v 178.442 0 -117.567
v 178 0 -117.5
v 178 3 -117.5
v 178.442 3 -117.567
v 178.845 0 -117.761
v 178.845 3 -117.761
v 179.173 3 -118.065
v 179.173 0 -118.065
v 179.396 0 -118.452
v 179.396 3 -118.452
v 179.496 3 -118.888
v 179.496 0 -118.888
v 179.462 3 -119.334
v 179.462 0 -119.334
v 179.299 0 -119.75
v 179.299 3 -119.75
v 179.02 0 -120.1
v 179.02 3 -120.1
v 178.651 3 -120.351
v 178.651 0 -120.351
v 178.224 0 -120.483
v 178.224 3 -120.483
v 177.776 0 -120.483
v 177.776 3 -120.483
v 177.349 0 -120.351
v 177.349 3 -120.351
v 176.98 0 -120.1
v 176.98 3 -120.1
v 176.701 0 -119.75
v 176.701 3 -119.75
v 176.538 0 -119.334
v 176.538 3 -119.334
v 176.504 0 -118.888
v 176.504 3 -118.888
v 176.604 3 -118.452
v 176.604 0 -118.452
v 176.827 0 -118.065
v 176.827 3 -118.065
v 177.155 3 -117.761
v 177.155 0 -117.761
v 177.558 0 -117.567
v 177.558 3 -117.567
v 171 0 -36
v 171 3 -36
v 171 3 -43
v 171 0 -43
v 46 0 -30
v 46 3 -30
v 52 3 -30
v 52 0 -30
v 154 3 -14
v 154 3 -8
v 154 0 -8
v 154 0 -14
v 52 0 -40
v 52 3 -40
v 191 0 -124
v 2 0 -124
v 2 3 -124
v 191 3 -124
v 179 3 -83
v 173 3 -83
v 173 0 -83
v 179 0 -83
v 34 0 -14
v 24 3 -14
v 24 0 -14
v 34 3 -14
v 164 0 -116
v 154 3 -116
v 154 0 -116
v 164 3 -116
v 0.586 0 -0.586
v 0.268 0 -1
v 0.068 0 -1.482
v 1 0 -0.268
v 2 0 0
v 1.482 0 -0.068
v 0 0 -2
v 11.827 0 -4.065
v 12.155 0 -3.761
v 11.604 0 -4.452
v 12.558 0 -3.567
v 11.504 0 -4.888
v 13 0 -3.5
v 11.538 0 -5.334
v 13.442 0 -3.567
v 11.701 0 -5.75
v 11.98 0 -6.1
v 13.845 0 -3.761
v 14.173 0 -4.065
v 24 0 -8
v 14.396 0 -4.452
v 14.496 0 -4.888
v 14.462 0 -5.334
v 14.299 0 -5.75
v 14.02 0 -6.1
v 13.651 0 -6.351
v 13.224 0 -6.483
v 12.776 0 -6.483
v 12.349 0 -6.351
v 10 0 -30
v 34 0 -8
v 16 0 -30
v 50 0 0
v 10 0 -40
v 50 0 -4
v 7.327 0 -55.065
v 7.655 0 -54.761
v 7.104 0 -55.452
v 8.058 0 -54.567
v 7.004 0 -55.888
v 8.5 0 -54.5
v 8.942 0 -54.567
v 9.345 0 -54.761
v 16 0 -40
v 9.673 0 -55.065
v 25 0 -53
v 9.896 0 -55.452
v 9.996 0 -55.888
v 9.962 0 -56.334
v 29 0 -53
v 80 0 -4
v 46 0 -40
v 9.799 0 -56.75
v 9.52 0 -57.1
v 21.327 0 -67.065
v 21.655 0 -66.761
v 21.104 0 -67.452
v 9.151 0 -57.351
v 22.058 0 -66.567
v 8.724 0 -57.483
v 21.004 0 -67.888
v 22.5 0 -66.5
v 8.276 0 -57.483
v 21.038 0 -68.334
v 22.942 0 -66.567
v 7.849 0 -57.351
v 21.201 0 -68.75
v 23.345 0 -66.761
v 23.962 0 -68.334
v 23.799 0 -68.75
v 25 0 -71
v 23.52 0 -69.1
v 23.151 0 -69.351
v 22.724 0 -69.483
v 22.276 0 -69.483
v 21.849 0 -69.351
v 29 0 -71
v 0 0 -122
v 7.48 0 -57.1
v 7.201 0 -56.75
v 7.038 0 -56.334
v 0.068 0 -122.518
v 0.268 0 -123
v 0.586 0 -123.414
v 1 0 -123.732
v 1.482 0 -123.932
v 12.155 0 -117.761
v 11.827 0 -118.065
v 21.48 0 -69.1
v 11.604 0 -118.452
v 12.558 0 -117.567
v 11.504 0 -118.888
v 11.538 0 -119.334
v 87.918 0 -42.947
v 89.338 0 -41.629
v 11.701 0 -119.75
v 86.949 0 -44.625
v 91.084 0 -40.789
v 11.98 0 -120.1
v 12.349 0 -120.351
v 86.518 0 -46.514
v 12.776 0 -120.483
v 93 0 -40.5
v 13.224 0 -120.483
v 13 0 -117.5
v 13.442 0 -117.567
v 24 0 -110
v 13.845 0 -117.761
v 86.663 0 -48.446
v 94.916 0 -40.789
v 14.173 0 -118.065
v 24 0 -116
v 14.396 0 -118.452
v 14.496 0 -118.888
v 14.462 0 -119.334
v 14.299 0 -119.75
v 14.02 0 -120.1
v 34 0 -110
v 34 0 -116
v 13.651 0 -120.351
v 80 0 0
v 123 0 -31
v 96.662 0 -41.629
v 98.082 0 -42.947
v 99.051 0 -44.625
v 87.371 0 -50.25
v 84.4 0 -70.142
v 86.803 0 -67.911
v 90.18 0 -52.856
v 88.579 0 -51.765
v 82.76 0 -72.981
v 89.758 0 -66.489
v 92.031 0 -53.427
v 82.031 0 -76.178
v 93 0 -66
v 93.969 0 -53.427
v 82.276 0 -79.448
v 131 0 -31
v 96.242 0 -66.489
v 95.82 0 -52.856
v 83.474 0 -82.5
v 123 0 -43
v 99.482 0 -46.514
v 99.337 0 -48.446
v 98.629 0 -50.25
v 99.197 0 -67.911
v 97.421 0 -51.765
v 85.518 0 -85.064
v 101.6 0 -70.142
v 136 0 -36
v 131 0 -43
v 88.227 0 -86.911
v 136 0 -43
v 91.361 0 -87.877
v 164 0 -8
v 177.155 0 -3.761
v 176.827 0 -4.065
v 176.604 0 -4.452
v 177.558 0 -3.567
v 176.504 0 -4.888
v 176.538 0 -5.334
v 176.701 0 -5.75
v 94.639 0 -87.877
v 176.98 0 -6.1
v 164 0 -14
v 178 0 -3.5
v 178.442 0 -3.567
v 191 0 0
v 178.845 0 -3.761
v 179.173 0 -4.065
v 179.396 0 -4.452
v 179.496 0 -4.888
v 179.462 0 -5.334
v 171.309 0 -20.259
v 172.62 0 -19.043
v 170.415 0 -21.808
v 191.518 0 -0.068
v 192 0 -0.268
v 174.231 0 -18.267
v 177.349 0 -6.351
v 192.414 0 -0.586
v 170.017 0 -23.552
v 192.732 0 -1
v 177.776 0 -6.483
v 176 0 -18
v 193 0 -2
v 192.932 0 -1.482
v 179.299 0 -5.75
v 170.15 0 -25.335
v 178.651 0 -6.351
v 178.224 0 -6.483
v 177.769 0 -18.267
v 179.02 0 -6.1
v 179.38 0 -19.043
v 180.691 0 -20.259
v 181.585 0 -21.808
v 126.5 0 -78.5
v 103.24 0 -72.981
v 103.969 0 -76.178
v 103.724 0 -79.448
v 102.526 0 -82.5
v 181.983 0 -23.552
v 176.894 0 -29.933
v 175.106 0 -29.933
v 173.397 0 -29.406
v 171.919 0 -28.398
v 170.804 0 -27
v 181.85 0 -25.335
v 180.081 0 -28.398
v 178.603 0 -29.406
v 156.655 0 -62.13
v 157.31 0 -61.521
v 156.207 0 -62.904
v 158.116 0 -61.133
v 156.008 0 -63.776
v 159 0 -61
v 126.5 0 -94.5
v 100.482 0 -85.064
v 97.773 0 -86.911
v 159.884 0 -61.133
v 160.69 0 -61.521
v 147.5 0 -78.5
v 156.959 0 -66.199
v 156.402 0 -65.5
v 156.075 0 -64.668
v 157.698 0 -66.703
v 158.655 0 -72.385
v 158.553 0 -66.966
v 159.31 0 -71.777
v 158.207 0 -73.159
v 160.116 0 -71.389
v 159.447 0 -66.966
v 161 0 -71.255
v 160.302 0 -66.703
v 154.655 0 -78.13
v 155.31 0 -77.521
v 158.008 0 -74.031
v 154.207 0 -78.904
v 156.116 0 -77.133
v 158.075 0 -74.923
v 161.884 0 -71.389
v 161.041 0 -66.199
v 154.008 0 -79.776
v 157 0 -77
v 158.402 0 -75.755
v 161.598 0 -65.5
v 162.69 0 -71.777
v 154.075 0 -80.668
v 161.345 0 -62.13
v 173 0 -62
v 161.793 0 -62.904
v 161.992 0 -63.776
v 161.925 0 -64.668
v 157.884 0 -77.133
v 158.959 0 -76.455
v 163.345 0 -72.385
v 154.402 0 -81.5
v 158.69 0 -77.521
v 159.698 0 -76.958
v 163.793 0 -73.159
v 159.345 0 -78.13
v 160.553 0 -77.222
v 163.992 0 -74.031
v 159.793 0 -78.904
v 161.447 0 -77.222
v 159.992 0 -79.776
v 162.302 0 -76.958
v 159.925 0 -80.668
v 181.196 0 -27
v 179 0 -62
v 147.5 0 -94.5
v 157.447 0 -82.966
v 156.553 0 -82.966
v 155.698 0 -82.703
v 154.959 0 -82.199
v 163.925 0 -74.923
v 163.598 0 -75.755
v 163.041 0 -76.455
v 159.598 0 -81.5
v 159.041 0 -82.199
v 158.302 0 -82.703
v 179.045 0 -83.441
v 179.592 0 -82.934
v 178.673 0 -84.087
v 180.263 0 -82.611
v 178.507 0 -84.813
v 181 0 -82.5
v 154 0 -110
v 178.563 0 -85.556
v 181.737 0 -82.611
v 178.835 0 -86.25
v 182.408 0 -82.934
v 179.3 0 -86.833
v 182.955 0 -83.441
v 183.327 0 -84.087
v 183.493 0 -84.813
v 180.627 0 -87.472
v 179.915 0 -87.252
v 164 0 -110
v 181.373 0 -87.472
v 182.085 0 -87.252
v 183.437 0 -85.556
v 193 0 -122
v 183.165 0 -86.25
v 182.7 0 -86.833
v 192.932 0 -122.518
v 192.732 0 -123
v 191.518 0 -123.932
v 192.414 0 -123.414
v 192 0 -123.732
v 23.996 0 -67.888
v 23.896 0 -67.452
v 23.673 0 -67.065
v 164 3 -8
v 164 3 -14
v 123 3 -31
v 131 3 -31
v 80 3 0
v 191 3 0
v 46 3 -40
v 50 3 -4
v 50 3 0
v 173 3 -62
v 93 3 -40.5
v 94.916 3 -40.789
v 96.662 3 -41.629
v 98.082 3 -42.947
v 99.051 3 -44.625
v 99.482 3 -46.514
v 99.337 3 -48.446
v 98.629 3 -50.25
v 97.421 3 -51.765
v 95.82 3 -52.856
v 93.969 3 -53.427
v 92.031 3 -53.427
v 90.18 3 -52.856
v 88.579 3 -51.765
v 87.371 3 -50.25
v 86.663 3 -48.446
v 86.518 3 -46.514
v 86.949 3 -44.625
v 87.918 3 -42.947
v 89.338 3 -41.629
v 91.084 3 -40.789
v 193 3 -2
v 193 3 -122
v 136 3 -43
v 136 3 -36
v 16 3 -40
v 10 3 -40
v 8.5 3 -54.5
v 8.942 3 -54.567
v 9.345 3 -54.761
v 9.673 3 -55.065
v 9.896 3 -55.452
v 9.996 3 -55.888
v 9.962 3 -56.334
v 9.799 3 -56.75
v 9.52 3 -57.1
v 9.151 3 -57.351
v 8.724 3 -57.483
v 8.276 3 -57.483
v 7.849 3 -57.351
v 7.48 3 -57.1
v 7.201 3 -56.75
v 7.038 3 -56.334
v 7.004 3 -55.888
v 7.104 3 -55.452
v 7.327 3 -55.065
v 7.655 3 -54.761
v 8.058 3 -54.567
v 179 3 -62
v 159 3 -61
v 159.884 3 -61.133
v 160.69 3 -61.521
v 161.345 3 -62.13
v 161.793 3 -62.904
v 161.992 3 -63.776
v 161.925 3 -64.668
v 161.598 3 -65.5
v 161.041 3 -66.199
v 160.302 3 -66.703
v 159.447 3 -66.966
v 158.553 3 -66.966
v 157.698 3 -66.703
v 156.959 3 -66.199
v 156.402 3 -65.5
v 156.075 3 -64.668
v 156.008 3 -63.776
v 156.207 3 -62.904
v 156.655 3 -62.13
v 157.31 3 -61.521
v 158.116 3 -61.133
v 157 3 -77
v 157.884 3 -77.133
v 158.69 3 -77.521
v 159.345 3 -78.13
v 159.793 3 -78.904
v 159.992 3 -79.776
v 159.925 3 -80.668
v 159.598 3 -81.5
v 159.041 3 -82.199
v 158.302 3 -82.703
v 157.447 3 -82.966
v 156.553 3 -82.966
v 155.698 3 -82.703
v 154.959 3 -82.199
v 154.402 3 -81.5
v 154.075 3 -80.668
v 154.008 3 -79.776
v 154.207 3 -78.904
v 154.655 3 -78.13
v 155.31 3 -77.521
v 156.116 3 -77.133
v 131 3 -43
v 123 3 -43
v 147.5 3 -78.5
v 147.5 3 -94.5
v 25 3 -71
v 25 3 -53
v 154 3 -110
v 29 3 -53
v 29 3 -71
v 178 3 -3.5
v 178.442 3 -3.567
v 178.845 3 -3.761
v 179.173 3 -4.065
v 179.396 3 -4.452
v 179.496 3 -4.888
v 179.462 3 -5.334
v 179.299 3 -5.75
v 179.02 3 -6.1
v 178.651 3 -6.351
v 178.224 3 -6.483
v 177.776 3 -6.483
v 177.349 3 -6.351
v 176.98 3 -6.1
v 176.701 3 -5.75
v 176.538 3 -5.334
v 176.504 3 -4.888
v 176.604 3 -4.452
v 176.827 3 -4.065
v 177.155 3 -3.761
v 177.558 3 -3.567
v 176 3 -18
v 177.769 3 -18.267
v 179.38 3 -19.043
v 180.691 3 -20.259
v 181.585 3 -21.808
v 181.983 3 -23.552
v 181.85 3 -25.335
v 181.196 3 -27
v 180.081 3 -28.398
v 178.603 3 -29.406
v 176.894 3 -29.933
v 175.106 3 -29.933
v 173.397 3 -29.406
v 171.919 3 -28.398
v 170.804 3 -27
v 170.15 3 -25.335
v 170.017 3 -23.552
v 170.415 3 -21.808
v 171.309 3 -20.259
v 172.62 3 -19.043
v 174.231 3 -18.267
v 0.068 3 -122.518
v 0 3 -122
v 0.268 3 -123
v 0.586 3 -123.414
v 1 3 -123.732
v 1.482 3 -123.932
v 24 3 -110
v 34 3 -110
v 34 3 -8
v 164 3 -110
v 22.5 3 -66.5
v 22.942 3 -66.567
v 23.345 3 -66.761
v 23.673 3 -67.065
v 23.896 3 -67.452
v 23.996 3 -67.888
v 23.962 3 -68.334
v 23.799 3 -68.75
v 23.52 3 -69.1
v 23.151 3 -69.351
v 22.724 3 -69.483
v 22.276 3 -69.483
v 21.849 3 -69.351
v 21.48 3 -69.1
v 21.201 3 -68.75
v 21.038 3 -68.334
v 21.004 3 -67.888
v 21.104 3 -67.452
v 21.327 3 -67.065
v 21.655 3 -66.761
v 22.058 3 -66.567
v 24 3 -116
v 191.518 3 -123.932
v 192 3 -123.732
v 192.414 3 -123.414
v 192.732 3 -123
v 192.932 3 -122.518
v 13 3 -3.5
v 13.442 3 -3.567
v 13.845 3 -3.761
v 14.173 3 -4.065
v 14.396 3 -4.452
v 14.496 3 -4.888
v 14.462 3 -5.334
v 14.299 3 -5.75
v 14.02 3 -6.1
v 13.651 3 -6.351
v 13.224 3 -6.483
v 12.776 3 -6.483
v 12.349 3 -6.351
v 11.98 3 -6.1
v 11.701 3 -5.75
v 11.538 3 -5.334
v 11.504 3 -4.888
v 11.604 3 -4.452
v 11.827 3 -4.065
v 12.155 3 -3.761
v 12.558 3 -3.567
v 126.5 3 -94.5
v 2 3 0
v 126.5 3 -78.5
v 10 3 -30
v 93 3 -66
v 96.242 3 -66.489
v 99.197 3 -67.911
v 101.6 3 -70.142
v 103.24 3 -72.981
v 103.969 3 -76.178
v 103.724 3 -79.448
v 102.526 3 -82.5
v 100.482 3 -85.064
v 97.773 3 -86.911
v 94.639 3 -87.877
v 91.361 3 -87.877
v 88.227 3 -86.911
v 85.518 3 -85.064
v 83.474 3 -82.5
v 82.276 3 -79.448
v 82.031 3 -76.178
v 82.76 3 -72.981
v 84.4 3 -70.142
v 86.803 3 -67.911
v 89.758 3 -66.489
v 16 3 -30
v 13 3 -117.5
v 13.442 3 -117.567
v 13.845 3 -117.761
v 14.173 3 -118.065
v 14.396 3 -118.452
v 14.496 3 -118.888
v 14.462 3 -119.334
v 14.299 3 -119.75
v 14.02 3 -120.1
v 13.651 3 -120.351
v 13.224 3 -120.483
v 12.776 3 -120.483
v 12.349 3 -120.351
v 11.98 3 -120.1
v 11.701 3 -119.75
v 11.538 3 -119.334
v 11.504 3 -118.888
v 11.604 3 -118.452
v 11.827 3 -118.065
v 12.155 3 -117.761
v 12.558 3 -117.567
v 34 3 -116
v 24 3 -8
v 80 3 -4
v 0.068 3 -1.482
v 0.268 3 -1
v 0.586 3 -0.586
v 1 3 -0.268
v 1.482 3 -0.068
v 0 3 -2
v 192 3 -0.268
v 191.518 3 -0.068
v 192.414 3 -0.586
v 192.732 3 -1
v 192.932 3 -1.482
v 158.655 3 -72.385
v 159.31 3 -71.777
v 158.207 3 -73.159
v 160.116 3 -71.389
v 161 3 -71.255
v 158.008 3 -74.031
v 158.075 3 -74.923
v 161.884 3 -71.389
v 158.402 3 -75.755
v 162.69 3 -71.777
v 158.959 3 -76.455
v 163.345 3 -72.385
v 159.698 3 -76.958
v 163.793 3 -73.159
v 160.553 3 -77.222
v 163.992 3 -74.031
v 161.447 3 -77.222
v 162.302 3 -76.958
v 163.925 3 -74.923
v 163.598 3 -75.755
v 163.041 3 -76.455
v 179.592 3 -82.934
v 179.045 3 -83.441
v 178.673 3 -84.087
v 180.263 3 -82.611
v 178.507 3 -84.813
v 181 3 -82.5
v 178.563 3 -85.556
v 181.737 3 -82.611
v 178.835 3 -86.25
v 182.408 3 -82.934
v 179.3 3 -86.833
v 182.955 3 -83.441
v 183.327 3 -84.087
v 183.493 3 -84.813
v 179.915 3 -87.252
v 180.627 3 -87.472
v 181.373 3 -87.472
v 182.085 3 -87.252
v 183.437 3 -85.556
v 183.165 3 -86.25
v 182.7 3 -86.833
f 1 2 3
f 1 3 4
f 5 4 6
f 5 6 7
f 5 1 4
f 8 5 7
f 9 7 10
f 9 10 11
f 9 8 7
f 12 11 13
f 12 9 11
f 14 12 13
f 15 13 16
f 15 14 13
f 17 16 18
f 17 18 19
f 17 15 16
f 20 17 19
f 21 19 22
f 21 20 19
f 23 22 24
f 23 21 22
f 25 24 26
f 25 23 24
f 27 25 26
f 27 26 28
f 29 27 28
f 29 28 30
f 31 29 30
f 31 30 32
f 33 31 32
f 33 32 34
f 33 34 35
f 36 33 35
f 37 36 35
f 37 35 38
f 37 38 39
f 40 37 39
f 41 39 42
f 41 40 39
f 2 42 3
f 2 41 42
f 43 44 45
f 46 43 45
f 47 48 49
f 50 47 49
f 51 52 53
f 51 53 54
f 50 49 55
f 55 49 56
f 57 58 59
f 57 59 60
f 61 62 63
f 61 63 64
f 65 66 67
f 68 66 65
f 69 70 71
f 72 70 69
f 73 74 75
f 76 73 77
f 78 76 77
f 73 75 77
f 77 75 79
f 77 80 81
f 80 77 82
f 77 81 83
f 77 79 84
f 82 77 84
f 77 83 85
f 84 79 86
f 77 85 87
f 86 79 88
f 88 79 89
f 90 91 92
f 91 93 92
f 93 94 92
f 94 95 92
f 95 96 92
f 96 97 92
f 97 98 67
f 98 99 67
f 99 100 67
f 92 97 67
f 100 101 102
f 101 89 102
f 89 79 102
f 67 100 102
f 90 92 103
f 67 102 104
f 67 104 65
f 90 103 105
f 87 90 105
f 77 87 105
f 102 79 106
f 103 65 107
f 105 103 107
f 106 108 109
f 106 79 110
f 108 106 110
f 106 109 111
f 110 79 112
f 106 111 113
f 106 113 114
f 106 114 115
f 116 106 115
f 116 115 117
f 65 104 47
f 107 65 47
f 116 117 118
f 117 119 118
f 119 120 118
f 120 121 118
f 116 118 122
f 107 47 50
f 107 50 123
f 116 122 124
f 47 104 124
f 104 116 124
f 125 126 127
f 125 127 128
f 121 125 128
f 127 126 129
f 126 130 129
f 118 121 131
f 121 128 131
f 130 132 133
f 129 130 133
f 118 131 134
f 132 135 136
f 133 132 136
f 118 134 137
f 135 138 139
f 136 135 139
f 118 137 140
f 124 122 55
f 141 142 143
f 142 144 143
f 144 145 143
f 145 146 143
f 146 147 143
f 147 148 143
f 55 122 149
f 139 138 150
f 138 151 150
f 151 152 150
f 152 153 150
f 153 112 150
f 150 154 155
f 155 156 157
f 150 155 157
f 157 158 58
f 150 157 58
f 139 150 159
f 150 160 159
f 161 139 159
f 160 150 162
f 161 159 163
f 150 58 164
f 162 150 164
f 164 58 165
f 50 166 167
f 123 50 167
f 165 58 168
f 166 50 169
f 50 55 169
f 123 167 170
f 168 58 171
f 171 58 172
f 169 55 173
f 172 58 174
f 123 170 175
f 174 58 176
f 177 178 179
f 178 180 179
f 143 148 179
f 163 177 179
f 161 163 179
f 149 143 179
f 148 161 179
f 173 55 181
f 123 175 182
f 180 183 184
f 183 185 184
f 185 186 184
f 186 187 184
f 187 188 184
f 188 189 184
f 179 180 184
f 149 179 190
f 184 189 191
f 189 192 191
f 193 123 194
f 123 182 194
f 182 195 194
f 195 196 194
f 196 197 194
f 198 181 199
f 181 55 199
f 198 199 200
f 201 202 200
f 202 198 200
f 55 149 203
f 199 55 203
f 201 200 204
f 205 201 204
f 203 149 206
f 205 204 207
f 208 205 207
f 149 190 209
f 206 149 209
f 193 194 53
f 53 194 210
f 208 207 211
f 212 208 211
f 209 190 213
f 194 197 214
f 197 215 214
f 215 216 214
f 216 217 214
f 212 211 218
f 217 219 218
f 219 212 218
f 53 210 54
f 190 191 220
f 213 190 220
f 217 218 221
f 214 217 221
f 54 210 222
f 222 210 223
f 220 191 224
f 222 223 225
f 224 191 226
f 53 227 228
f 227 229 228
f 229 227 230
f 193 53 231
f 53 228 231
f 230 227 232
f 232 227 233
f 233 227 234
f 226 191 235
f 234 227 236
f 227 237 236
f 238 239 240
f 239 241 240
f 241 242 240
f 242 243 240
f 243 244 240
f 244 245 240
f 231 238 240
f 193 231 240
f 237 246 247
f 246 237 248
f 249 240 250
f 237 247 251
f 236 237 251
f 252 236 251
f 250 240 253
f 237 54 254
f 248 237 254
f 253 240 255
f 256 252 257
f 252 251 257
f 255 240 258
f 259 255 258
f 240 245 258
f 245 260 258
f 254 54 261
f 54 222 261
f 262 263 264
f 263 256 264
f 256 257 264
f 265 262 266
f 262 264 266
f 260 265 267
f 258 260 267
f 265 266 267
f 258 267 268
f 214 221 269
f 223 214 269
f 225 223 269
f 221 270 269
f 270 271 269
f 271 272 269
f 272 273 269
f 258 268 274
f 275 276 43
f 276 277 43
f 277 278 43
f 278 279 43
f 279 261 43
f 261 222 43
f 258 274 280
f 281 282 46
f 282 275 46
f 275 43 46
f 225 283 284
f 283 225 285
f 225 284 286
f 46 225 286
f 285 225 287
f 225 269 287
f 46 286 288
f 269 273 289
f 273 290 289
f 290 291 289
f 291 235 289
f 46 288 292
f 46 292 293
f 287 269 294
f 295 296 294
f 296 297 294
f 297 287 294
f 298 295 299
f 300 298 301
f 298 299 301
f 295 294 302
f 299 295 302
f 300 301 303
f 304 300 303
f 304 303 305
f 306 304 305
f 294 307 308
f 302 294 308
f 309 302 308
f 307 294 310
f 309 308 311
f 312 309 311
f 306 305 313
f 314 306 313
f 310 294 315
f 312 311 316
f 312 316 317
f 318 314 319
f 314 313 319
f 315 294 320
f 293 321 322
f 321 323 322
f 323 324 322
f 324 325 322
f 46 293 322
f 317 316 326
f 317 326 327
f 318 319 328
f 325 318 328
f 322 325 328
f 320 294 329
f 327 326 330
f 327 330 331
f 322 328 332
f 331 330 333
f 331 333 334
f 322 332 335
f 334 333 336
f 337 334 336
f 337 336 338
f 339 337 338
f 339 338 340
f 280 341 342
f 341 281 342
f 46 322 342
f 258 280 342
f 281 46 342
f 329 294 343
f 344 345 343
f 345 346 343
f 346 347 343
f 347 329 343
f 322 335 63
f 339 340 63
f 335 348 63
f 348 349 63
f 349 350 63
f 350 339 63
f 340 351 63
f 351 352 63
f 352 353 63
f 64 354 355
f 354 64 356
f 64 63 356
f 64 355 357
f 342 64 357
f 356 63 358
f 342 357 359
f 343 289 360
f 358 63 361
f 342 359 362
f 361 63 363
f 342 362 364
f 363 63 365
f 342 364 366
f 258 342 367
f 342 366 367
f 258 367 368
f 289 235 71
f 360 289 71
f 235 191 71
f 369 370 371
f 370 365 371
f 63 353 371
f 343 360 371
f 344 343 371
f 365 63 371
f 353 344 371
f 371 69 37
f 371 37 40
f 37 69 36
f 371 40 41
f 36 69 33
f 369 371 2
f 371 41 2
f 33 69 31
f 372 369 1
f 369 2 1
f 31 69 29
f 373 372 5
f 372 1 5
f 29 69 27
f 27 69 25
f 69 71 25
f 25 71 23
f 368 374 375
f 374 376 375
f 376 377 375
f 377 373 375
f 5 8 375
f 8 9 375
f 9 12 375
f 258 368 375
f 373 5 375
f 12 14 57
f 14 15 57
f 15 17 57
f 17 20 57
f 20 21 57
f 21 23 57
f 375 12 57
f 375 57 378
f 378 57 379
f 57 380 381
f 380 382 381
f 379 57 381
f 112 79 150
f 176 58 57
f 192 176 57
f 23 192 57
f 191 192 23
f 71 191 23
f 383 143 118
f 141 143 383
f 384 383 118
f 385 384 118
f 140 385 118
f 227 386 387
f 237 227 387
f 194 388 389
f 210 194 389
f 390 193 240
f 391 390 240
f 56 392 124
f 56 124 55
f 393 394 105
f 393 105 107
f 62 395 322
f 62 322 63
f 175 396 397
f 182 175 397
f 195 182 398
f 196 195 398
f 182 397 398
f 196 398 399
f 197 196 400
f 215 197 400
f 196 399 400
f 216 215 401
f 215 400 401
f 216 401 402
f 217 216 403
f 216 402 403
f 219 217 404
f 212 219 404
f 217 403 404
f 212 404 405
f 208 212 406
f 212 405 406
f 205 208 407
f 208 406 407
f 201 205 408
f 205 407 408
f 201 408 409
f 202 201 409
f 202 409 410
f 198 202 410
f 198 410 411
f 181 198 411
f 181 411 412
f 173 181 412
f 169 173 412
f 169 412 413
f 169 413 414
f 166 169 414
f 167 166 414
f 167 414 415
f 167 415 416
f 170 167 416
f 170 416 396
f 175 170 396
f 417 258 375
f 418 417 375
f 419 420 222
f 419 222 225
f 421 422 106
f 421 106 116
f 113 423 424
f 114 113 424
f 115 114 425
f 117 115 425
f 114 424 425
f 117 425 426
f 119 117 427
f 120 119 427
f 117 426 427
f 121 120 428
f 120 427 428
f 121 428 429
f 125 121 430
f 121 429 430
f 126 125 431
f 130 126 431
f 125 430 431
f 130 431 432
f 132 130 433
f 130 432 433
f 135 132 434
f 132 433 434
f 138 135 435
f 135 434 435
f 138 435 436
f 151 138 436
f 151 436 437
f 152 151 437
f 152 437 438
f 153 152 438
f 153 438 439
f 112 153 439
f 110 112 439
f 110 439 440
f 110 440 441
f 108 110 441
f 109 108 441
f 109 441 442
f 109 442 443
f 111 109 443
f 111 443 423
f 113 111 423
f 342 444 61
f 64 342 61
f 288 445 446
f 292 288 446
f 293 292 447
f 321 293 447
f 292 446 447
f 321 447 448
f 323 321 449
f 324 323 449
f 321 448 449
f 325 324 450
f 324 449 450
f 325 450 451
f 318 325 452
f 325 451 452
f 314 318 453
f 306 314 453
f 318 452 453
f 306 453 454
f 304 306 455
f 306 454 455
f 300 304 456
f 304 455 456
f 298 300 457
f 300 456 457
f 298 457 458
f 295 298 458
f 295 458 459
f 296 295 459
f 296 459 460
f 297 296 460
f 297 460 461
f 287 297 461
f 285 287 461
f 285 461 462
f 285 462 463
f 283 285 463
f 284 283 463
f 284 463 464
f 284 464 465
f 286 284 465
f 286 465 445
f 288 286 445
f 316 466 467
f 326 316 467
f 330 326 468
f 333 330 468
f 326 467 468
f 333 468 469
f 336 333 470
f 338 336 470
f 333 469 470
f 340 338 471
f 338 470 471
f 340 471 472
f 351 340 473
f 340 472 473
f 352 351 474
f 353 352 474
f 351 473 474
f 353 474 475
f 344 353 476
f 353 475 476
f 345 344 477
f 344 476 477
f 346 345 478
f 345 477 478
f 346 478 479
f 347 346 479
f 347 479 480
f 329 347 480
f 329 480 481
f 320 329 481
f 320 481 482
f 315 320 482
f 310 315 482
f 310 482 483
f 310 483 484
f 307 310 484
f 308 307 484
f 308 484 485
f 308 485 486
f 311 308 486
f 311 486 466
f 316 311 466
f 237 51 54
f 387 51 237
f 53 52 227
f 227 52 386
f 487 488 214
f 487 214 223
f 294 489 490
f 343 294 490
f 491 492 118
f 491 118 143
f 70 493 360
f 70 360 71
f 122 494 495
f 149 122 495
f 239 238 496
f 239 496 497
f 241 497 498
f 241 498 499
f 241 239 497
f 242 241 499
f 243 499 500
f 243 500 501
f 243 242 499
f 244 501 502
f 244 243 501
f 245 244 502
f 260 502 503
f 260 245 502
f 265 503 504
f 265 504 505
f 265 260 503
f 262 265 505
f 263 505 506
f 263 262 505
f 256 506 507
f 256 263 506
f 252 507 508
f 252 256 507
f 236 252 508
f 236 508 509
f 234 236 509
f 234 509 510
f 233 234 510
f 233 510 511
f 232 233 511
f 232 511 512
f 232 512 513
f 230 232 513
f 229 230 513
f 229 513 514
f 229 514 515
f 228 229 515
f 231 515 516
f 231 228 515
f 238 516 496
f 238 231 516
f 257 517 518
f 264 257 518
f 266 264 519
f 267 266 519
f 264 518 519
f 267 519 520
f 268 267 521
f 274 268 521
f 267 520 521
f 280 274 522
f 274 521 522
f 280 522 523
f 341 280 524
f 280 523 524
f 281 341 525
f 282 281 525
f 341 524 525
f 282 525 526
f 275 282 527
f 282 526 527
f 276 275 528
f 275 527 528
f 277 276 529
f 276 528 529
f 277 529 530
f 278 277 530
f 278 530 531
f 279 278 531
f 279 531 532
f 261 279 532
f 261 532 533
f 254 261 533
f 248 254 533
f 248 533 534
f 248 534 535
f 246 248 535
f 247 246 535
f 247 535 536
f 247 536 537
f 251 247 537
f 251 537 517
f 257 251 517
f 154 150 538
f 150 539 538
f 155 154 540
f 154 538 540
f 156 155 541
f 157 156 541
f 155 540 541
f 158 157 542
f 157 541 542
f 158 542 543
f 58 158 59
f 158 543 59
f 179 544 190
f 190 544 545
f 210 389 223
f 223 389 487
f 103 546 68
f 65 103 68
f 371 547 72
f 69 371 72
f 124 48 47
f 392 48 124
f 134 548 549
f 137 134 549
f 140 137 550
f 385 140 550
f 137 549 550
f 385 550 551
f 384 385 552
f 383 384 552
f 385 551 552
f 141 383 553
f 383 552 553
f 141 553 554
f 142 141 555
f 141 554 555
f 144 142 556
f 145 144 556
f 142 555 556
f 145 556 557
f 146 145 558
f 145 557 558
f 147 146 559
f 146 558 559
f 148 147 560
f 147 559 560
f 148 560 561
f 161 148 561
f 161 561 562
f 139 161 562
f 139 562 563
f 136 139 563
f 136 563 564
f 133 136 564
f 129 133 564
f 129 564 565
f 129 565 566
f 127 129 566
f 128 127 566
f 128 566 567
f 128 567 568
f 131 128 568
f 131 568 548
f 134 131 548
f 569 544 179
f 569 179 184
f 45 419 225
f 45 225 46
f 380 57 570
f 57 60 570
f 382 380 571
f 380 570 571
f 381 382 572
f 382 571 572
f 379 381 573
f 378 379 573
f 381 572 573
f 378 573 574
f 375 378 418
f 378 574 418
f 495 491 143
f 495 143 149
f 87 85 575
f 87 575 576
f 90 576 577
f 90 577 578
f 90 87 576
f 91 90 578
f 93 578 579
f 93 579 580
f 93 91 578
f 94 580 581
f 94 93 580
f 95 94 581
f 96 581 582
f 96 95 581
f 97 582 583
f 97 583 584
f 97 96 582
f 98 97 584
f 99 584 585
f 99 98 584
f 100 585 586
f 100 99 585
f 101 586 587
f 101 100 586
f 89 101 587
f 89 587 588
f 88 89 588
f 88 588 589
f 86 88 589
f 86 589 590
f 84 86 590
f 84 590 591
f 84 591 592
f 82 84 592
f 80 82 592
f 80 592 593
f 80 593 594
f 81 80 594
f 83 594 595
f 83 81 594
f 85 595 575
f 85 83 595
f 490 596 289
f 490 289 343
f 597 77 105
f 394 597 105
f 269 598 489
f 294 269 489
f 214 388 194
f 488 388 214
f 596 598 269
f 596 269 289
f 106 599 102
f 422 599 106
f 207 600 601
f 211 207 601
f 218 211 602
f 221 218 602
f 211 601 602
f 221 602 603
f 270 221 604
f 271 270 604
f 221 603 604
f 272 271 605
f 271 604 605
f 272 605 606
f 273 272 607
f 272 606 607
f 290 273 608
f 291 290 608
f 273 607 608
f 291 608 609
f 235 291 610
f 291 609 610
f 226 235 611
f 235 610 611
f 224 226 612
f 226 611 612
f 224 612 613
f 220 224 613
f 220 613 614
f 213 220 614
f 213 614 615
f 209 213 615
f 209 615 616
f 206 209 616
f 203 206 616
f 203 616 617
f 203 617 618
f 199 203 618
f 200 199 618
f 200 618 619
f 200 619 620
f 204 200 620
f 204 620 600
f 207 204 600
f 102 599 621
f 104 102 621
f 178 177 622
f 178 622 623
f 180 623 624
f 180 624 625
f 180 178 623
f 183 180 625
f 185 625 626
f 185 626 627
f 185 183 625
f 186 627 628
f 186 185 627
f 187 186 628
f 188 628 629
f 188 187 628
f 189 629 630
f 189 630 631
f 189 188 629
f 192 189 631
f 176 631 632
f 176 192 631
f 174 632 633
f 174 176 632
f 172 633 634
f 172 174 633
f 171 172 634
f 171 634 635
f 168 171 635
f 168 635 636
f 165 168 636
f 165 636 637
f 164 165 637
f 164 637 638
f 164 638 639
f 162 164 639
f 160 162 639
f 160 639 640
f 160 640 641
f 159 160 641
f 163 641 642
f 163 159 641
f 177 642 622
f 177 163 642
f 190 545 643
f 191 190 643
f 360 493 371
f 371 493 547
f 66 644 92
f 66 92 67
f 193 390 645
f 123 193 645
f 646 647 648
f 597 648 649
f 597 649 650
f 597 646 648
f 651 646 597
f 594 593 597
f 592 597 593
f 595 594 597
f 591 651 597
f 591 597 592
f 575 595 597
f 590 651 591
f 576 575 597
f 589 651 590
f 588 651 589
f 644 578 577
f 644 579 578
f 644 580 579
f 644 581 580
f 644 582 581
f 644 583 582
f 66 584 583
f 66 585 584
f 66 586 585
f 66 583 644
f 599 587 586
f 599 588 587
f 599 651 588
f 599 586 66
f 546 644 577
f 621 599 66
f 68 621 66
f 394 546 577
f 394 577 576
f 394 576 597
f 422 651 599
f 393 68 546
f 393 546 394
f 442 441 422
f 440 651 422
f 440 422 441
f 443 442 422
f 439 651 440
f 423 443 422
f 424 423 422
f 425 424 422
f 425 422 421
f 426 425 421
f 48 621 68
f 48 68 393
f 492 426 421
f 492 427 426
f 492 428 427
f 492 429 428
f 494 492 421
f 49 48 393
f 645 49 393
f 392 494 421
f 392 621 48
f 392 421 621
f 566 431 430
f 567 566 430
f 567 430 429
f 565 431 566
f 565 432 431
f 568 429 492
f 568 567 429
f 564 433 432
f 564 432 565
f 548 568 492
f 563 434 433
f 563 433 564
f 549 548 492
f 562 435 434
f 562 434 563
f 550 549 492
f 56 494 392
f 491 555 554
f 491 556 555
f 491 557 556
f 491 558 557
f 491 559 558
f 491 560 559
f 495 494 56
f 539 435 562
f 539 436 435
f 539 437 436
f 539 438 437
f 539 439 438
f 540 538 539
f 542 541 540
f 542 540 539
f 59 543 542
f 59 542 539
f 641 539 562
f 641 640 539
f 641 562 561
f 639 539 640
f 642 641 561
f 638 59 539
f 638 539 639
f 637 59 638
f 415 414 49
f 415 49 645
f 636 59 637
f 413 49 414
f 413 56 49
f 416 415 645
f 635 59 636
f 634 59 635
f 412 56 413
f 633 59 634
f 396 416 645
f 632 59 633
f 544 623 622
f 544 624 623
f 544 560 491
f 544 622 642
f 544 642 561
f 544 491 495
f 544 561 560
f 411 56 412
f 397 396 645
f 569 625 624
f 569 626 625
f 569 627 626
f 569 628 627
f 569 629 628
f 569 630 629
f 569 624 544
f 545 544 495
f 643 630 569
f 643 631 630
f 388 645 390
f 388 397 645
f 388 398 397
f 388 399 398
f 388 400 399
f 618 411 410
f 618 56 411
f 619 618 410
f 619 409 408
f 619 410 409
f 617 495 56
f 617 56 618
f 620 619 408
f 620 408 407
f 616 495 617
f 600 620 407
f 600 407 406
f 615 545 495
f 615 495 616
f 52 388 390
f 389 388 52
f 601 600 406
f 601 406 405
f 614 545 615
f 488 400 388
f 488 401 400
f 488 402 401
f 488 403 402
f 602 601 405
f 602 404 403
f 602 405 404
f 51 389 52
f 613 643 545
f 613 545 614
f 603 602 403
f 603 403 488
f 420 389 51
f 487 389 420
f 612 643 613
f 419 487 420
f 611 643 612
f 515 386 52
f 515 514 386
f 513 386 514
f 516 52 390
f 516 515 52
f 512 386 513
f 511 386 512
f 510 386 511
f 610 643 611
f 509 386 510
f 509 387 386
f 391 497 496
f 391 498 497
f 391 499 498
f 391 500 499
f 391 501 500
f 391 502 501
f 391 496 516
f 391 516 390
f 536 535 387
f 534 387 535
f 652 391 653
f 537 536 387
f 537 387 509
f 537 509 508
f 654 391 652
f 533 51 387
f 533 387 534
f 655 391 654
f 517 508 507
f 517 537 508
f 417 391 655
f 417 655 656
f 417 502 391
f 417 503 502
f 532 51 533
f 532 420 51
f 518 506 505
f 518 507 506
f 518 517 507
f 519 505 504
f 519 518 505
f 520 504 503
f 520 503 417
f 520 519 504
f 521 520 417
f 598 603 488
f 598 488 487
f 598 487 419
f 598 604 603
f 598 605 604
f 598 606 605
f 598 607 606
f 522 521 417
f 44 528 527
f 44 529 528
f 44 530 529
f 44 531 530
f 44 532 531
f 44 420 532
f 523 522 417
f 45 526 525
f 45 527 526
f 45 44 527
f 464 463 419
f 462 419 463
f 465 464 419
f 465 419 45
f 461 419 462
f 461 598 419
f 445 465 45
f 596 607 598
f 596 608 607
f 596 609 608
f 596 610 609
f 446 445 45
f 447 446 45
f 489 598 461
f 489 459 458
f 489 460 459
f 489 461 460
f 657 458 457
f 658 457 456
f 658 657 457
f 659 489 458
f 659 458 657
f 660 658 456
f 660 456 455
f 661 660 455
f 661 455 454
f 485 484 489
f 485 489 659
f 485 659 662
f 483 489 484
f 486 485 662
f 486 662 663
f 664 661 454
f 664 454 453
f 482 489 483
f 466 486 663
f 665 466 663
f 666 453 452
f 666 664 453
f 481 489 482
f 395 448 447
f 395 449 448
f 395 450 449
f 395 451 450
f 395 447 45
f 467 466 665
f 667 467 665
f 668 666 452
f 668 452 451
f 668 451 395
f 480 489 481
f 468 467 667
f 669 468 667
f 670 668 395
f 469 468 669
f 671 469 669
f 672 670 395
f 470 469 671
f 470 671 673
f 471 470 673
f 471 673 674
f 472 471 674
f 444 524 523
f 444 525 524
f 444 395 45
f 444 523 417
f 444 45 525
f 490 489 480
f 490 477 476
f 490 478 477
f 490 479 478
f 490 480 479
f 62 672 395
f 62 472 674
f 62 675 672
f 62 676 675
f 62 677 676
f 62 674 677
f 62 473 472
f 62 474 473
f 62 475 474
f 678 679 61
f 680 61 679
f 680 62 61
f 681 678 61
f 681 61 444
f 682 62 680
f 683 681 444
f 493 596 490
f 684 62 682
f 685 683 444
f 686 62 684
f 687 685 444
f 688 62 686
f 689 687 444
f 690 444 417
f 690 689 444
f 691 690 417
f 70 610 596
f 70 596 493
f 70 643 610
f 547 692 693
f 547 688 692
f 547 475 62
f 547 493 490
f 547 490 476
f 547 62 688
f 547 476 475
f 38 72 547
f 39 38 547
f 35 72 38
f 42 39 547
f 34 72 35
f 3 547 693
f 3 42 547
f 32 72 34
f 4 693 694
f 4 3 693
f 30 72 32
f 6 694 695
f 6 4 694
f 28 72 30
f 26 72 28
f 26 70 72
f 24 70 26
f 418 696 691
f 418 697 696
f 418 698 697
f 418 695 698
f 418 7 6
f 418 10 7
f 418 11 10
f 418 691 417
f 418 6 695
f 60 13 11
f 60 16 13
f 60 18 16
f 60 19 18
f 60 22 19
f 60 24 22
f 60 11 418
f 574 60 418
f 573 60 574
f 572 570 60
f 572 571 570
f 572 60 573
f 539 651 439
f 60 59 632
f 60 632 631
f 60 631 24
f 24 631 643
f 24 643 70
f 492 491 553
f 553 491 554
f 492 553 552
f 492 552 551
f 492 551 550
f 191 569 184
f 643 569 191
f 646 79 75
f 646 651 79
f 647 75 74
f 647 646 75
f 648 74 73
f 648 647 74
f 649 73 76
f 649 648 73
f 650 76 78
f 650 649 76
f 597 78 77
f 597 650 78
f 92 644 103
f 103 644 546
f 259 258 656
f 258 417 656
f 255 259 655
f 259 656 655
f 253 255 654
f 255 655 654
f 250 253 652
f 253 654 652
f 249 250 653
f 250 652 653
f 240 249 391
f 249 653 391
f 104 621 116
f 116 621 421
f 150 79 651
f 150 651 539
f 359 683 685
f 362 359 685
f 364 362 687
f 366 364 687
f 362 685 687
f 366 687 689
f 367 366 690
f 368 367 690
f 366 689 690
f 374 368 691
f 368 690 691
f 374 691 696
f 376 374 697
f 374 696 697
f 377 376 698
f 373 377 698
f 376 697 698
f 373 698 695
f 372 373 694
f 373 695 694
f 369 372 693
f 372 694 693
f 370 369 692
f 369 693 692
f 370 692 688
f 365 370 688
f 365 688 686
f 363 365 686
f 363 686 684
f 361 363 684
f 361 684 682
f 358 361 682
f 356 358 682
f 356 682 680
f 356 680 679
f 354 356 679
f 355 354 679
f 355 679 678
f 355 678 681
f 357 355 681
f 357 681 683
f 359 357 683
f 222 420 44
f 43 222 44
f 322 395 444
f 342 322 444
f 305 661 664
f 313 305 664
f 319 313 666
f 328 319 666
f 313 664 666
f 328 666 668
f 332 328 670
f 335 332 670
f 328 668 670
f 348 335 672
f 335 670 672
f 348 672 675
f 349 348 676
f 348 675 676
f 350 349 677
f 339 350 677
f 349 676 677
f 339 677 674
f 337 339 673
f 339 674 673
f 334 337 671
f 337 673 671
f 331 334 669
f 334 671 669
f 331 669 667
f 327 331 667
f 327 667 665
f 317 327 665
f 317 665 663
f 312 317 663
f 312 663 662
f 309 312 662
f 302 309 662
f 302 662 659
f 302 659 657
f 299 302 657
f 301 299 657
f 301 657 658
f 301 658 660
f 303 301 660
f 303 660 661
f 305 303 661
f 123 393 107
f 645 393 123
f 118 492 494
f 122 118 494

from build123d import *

# Parameters (mm, degrees)
SKETCH1_W           = 193
SKETCH1_H           = 124
SKETCH1_R           = 1.5
BOSS_EXTRUDE1_DEPTH = 3
SKETCH2_R           = 3
SKETCH2_R_2         = 2.5
SKETCH2_R_3         = 6
SKETCH2_W           = 35
SKETCH2_H           = 7
SKETCH2_W_2         = 21
SKETCH2_H_2         = 16
SKETCH2_W_3         = 6
SKETCH2_H_3         = 21
SKETCH2_W_4         = 8
SKETCH2_H_4         = 12
CUT_EXTRUDE1_DEPTH  = 230.421010372
SKETCH3_R           = 11
SKETCH3_R_2         = 6.5
CUT_EXTRUDE2_DEPTH  = 230.421010372
SKETCH4_W           = 10
SKETCH4_H           = 6
CUT_EXTRUDE3_DEPTH  = 230.421010372
SKETCH5_W           = 30
SKETCH5_H           = 4
CUT_EXTRUDE4_DEPTH  = 230.421010372
SKETCH6_R           = 1.5
SKETCH6_W           = 4
SKETCH6_H           = 18
CUT_EXTRUDE5_DEPTH  = 230.421010372
SKETCH7_W           = 6
SKETCH7_H           = 10
CUT_EXTRUDE6_DEPTH  = 230.421010372
FILLET1_R           = 2


with BuildPart() as part:
    # Sketch1 → Boss-Extrude1 (new body)
    with BuildSketch(Plane(origin=(0, 0, 0), x_dir=(1, 0, 0), z_dir=(0, 1, 0))):
        with Locations((96.5, 62)):
            Rectangle(SKETCH1_W, SKETCH1_H)
        with Locations(Location((13, 119, 0), (0, 0, 270))):
            Circle(SKETCH1_R, mode=Mode.SUBTRACT)
        with Locations(Location((178, 119, 0), (0, 0, 270))):
            Circle(SKETCH1_R, mode=Mode.SUBTRACT)
        with Locations(Location((13, 5, 0), (0, 0, 270))):
            Circle(SKETCH1_R, mode=Mode.SUBTRACT)
        with Locations(Location((178, 5, 0), (0, 0, 270))):
            Circle(SKETCH1_R, mode=Mode.SUBTRACT)
    extrude(amount=BOSS_EXTRUDE1_DEPTH)

    # Sketch2 → Cut-Extrude1 (cut, through all)
    with BuildSketch(Plane(origin=(0, 3, 0), x_dir=(1, 0, 0), z_dir=(0, 1, 0))):
        with Locations(Location((157, 80, 0), (0, 0, 270))):
            Circle(SKETCH2_R)
        with Locations(Location((161, 74.255437353, 0), (0, 0, 270))):
            Circle(SKETCH2_R)
        with Locations(Location((159, 64, 0), (0, 0, 270))):
            Circle(SKETCH2_R)
        with Locations(Location((181, 85, 0), (0, 0, 270))):
            Circle(SKETCH2_R_2)
        with Locations(Location((176, 24, 0), (0, 0, 270))):
            Circle(SKETCH2_R_3)
        with Locations((153.5, 39.5)):
            Rectangle(SKETCH2_W, SKETCH2_H)
        with Locations((137, 86.5)):
            Rectangle(SKETCH2_W_2, SKETCH2_H_2)
        with Locations((176, 72.5)):
            Rectangle(SKETCH2_W_3, SKETCH2_H_3)
        with Locations((127, 37)):
            Rectangle(SKETCH2_W_4, SKETCH2_H_4)
    extrude(amount=-CUT_EXTRUDE1_DEPTH, mode=Mode.SUBTRACT)

    # Sketch3 → Cut-Extrude2 (cut, through all)
    with BuildSketch(Plane(origin=(0, 3, 0), x_dir=(1, 0, 0), z_dir=(0, 1, 0))):
        with Locations(Location((93, 77, 0), (0, 0, 270))):
            Circle(SKETCH3_R)
        with Locations(Location((93, 47, 0), (0, 0, 270))):
            Circle(SKETCH3_R_2)
    extrude(amount=-CUT_EXTRUDE2_DEPTH, mode=Mode.SUBTRACT)

    # Sketch4 → Cut-Extrude3 (cut, through all)
    with BuildSketch(Plane(origin=(0, 3, 0), x_dir=(1, 0, 0), z_dir=(0, 1, 0))):
        with Locations((29, 113)):
            Rectangle(SKETCH4_W, SKETCH4_H)
        with Locations((159, 113)):
            Rectangle(SKETCH4_W, SKETCH4_H)
        with Locations((29, 11)):
            Rectangle(SKETCH4_W, SKETCH4_H)
        with Locations((159, 11)):
            Rectangle(SKETCH4_W, SKETCH4_H)
    extrude(amount=-CUT_EXTRUDE3_DEPTH, mode=Mode.SUBTRACT)

    # Sketch5 → Cut-Extrude4 (cut, through all)
    with BuildSketch(Plane(origin=(0, 3, 0), x_dir=(1, 0, 0), z_dir=(0, 1, 0))):
        with Locations((65, 2)):
            Rectangle(SKETCH5_W, SKETCH5_H)
    extrude(amount=-CUT_EXTRUDE4_DEPTH, mode=Mode.SUBTRACT)

    # Sketch6 → Cut-Extrude5 (cut, through all)
    with BuildSketch(Plane(origin=(0, 3, 0), x_dir=(1, 0, 0), z_dir=(0, 1, 0))):
        with Locations(Location((8.5, 56, 0), (0, 0, 270))):
            Circle(SKETCH6_R)
        with Locations(Location((22.5, 68, 0), (0, 0, 270))):
            Circle(SKETCH6_R)
        with Locations((27, 62)):
            Rectangle(SKETCH6_W, SKETCH6_H)
    extrude(amount=-CUT_EXTRUDE5_DEPTH, mode=Mode.SUBTRACT)

    # Sketch7 → Cut-Extrude6 (cut, through all)
    with BuildSketch(Plane(origin=(0, 3, 0), x_dir=(1, 0, 0), z_dir=(0, 1, 0))):
        with Locations((13, 35)):
            Rectangle(SKETCH7_W, SKETCH7_H)
        with Locations((49, 35)):
            Rectangle(SKETCH7_W, SKETCH7_H)
    extrude(amount=-CUT_EXTRUDE6_DEPTH, mode=Mode.SUBTRACT)

    # Fillet1
    fillet1_edges = [part.edges().sort_by_distance(p)[0] for p in [
        (0, 1.5, -124),
        (193, 1.5, -124),
        (193, 1.5, 0),
        (0, 1.5, 0),
    ]]
    fillet(fillet1_edges, radius=FILLET1_R)


solid = part.part
